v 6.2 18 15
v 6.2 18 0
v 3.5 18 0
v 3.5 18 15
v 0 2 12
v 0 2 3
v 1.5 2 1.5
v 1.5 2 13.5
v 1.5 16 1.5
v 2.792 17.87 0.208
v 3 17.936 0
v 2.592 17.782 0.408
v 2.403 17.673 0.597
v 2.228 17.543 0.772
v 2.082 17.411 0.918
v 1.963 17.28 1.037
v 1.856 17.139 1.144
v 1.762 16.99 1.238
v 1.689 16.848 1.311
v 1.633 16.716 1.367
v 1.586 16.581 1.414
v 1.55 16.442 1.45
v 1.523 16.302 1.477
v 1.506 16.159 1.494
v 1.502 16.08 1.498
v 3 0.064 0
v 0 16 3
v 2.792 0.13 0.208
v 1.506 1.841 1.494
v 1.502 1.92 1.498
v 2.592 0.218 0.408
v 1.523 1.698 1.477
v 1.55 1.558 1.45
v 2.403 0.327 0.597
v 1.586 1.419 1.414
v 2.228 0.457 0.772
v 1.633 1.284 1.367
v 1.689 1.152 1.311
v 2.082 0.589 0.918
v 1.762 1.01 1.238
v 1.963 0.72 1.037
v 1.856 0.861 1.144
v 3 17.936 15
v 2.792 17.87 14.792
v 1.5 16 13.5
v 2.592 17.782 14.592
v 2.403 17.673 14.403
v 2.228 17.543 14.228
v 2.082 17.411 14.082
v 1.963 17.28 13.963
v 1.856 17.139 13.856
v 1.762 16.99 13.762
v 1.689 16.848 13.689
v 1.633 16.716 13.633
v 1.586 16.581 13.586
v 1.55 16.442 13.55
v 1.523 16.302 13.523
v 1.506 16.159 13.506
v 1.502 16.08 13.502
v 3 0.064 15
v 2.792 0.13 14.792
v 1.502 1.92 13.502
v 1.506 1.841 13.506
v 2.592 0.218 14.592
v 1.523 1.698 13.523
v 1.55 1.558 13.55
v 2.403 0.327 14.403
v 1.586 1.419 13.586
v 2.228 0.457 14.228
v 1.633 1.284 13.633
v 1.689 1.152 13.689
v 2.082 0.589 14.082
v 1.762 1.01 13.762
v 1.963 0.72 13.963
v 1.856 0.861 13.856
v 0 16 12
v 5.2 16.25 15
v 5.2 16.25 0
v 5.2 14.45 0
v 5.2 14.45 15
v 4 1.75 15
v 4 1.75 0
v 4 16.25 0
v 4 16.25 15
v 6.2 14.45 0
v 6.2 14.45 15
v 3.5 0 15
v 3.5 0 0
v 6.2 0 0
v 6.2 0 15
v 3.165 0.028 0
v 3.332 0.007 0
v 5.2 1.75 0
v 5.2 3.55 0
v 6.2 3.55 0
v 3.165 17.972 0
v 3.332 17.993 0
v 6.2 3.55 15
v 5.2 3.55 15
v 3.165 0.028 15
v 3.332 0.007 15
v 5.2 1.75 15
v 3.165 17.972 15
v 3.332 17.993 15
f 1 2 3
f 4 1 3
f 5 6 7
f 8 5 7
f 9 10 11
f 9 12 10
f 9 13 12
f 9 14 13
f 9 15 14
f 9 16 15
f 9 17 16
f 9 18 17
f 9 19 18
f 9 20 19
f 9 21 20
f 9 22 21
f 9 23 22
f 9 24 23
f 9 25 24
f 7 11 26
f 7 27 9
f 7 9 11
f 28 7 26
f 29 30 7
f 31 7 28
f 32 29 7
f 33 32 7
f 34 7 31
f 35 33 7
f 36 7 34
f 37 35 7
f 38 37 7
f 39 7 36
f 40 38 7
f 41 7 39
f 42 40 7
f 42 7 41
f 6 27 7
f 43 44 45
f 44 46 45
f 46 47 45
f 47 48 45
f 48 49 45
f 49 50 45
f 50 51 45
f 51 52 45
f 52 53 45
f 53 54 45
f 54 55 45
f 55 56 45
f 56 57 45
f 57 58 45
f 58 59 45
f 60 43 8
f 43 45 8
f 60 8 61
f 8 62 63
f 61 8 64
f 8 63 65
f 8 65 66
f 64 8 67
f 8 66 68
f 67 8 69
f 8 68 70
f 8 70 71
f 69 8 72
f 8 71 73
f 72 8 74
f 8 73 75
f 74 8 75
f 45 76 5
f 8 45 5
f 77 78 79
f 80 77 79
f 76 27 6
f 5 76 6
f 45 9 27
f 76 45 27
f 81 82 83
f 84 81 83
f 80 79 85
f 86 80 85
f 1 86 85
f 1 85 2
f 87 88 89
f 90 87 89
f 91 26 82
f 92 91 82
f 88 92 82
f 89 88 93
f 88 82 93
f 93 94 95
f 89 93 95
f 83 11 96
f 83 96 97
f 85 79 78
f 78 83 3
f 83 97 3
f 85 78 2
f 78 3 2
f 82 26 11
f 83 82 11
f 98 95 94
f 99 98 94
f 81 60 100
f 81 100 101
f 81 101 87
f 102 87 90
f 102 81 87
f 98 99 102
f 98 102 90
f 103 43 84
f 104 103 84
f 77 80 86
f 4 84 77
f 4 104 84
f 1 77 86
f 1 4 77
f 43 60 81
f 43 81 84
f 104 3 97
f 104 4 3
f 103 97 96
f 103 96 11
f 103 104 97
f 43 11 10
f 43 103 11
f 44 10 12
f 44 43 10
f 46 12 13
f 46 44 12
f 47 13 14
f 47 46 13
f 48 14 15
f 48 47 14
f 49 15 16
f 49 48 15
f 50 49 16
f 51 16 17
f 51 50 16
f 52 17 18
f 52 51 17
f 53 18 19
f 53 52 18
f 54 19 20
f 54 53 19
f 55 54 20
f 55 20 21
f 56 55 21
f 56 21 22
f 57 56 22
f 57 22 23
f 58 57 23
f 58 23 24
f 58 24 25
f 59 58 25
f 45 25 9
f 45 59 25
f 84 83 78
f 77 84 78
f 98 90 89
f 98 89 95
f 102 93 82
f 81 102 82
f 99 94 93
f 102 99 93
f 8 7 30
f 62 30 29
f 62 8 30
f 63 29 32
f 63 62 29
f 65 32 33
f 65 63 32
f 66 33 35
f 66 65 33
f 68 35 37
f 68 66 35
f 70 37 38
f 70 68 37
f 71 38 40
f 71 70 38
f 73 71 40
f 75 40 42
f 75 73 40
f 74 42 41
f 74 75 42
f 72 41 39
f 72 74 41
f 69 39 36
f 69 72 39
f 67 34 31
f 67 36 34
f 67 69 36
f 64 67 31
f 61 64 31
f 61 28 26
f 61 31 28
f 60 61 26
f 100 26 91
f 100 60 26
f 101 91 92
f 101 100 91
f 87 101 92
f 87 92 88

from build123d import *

# Parameters (mm, degrees)
F1_DEPTH = 15
F2_R     = 1.99999
F3_SIZE  = 3


# Not quite as in the source:
# - a fillet or chamfer is up to 0.001 mm smaller than in the source, because OpenCascade refuses the exact size


with BuildPart() as f1:
    # F0 (on Top) → F1 (new body)
    with BuildSketch(Plane.XY):
        Polygon((0, 16), (0, 2), (1.5, 2), (1.5, 0), (6.2, 0), (6.2, 3.55), (5.2, 3.55), (5.2, 1.75), (4, 1.75), (4, 16.25), (5.2, 16.25), (5.2, 14.45), (6.2, 14.45), (6.2, 18), (1.5, 18), (1.5, 16), align=None)
    extrude(amount=F1_DEPTH)

    # F2 (radius 2 in the source; OpenCascade refuses exactly that, so slightly less here)
    f2_edges = [f1.edges().sort_by_distance(p)[0] for p in [
        (1.5, 0, 7.5),
        (1.5, 18, 7.5),
    ]]
    fillet(f2_edges, radius=F2_R)

    # F3
    f3_edges = [f1.edges().sort_by_distance(p)[0] for p in [
        (0, 9, 0),
        (0, 9, 15),
    ]]
    chamfer(f3_edges, length=F3_SIZE)


solid = f1.part
